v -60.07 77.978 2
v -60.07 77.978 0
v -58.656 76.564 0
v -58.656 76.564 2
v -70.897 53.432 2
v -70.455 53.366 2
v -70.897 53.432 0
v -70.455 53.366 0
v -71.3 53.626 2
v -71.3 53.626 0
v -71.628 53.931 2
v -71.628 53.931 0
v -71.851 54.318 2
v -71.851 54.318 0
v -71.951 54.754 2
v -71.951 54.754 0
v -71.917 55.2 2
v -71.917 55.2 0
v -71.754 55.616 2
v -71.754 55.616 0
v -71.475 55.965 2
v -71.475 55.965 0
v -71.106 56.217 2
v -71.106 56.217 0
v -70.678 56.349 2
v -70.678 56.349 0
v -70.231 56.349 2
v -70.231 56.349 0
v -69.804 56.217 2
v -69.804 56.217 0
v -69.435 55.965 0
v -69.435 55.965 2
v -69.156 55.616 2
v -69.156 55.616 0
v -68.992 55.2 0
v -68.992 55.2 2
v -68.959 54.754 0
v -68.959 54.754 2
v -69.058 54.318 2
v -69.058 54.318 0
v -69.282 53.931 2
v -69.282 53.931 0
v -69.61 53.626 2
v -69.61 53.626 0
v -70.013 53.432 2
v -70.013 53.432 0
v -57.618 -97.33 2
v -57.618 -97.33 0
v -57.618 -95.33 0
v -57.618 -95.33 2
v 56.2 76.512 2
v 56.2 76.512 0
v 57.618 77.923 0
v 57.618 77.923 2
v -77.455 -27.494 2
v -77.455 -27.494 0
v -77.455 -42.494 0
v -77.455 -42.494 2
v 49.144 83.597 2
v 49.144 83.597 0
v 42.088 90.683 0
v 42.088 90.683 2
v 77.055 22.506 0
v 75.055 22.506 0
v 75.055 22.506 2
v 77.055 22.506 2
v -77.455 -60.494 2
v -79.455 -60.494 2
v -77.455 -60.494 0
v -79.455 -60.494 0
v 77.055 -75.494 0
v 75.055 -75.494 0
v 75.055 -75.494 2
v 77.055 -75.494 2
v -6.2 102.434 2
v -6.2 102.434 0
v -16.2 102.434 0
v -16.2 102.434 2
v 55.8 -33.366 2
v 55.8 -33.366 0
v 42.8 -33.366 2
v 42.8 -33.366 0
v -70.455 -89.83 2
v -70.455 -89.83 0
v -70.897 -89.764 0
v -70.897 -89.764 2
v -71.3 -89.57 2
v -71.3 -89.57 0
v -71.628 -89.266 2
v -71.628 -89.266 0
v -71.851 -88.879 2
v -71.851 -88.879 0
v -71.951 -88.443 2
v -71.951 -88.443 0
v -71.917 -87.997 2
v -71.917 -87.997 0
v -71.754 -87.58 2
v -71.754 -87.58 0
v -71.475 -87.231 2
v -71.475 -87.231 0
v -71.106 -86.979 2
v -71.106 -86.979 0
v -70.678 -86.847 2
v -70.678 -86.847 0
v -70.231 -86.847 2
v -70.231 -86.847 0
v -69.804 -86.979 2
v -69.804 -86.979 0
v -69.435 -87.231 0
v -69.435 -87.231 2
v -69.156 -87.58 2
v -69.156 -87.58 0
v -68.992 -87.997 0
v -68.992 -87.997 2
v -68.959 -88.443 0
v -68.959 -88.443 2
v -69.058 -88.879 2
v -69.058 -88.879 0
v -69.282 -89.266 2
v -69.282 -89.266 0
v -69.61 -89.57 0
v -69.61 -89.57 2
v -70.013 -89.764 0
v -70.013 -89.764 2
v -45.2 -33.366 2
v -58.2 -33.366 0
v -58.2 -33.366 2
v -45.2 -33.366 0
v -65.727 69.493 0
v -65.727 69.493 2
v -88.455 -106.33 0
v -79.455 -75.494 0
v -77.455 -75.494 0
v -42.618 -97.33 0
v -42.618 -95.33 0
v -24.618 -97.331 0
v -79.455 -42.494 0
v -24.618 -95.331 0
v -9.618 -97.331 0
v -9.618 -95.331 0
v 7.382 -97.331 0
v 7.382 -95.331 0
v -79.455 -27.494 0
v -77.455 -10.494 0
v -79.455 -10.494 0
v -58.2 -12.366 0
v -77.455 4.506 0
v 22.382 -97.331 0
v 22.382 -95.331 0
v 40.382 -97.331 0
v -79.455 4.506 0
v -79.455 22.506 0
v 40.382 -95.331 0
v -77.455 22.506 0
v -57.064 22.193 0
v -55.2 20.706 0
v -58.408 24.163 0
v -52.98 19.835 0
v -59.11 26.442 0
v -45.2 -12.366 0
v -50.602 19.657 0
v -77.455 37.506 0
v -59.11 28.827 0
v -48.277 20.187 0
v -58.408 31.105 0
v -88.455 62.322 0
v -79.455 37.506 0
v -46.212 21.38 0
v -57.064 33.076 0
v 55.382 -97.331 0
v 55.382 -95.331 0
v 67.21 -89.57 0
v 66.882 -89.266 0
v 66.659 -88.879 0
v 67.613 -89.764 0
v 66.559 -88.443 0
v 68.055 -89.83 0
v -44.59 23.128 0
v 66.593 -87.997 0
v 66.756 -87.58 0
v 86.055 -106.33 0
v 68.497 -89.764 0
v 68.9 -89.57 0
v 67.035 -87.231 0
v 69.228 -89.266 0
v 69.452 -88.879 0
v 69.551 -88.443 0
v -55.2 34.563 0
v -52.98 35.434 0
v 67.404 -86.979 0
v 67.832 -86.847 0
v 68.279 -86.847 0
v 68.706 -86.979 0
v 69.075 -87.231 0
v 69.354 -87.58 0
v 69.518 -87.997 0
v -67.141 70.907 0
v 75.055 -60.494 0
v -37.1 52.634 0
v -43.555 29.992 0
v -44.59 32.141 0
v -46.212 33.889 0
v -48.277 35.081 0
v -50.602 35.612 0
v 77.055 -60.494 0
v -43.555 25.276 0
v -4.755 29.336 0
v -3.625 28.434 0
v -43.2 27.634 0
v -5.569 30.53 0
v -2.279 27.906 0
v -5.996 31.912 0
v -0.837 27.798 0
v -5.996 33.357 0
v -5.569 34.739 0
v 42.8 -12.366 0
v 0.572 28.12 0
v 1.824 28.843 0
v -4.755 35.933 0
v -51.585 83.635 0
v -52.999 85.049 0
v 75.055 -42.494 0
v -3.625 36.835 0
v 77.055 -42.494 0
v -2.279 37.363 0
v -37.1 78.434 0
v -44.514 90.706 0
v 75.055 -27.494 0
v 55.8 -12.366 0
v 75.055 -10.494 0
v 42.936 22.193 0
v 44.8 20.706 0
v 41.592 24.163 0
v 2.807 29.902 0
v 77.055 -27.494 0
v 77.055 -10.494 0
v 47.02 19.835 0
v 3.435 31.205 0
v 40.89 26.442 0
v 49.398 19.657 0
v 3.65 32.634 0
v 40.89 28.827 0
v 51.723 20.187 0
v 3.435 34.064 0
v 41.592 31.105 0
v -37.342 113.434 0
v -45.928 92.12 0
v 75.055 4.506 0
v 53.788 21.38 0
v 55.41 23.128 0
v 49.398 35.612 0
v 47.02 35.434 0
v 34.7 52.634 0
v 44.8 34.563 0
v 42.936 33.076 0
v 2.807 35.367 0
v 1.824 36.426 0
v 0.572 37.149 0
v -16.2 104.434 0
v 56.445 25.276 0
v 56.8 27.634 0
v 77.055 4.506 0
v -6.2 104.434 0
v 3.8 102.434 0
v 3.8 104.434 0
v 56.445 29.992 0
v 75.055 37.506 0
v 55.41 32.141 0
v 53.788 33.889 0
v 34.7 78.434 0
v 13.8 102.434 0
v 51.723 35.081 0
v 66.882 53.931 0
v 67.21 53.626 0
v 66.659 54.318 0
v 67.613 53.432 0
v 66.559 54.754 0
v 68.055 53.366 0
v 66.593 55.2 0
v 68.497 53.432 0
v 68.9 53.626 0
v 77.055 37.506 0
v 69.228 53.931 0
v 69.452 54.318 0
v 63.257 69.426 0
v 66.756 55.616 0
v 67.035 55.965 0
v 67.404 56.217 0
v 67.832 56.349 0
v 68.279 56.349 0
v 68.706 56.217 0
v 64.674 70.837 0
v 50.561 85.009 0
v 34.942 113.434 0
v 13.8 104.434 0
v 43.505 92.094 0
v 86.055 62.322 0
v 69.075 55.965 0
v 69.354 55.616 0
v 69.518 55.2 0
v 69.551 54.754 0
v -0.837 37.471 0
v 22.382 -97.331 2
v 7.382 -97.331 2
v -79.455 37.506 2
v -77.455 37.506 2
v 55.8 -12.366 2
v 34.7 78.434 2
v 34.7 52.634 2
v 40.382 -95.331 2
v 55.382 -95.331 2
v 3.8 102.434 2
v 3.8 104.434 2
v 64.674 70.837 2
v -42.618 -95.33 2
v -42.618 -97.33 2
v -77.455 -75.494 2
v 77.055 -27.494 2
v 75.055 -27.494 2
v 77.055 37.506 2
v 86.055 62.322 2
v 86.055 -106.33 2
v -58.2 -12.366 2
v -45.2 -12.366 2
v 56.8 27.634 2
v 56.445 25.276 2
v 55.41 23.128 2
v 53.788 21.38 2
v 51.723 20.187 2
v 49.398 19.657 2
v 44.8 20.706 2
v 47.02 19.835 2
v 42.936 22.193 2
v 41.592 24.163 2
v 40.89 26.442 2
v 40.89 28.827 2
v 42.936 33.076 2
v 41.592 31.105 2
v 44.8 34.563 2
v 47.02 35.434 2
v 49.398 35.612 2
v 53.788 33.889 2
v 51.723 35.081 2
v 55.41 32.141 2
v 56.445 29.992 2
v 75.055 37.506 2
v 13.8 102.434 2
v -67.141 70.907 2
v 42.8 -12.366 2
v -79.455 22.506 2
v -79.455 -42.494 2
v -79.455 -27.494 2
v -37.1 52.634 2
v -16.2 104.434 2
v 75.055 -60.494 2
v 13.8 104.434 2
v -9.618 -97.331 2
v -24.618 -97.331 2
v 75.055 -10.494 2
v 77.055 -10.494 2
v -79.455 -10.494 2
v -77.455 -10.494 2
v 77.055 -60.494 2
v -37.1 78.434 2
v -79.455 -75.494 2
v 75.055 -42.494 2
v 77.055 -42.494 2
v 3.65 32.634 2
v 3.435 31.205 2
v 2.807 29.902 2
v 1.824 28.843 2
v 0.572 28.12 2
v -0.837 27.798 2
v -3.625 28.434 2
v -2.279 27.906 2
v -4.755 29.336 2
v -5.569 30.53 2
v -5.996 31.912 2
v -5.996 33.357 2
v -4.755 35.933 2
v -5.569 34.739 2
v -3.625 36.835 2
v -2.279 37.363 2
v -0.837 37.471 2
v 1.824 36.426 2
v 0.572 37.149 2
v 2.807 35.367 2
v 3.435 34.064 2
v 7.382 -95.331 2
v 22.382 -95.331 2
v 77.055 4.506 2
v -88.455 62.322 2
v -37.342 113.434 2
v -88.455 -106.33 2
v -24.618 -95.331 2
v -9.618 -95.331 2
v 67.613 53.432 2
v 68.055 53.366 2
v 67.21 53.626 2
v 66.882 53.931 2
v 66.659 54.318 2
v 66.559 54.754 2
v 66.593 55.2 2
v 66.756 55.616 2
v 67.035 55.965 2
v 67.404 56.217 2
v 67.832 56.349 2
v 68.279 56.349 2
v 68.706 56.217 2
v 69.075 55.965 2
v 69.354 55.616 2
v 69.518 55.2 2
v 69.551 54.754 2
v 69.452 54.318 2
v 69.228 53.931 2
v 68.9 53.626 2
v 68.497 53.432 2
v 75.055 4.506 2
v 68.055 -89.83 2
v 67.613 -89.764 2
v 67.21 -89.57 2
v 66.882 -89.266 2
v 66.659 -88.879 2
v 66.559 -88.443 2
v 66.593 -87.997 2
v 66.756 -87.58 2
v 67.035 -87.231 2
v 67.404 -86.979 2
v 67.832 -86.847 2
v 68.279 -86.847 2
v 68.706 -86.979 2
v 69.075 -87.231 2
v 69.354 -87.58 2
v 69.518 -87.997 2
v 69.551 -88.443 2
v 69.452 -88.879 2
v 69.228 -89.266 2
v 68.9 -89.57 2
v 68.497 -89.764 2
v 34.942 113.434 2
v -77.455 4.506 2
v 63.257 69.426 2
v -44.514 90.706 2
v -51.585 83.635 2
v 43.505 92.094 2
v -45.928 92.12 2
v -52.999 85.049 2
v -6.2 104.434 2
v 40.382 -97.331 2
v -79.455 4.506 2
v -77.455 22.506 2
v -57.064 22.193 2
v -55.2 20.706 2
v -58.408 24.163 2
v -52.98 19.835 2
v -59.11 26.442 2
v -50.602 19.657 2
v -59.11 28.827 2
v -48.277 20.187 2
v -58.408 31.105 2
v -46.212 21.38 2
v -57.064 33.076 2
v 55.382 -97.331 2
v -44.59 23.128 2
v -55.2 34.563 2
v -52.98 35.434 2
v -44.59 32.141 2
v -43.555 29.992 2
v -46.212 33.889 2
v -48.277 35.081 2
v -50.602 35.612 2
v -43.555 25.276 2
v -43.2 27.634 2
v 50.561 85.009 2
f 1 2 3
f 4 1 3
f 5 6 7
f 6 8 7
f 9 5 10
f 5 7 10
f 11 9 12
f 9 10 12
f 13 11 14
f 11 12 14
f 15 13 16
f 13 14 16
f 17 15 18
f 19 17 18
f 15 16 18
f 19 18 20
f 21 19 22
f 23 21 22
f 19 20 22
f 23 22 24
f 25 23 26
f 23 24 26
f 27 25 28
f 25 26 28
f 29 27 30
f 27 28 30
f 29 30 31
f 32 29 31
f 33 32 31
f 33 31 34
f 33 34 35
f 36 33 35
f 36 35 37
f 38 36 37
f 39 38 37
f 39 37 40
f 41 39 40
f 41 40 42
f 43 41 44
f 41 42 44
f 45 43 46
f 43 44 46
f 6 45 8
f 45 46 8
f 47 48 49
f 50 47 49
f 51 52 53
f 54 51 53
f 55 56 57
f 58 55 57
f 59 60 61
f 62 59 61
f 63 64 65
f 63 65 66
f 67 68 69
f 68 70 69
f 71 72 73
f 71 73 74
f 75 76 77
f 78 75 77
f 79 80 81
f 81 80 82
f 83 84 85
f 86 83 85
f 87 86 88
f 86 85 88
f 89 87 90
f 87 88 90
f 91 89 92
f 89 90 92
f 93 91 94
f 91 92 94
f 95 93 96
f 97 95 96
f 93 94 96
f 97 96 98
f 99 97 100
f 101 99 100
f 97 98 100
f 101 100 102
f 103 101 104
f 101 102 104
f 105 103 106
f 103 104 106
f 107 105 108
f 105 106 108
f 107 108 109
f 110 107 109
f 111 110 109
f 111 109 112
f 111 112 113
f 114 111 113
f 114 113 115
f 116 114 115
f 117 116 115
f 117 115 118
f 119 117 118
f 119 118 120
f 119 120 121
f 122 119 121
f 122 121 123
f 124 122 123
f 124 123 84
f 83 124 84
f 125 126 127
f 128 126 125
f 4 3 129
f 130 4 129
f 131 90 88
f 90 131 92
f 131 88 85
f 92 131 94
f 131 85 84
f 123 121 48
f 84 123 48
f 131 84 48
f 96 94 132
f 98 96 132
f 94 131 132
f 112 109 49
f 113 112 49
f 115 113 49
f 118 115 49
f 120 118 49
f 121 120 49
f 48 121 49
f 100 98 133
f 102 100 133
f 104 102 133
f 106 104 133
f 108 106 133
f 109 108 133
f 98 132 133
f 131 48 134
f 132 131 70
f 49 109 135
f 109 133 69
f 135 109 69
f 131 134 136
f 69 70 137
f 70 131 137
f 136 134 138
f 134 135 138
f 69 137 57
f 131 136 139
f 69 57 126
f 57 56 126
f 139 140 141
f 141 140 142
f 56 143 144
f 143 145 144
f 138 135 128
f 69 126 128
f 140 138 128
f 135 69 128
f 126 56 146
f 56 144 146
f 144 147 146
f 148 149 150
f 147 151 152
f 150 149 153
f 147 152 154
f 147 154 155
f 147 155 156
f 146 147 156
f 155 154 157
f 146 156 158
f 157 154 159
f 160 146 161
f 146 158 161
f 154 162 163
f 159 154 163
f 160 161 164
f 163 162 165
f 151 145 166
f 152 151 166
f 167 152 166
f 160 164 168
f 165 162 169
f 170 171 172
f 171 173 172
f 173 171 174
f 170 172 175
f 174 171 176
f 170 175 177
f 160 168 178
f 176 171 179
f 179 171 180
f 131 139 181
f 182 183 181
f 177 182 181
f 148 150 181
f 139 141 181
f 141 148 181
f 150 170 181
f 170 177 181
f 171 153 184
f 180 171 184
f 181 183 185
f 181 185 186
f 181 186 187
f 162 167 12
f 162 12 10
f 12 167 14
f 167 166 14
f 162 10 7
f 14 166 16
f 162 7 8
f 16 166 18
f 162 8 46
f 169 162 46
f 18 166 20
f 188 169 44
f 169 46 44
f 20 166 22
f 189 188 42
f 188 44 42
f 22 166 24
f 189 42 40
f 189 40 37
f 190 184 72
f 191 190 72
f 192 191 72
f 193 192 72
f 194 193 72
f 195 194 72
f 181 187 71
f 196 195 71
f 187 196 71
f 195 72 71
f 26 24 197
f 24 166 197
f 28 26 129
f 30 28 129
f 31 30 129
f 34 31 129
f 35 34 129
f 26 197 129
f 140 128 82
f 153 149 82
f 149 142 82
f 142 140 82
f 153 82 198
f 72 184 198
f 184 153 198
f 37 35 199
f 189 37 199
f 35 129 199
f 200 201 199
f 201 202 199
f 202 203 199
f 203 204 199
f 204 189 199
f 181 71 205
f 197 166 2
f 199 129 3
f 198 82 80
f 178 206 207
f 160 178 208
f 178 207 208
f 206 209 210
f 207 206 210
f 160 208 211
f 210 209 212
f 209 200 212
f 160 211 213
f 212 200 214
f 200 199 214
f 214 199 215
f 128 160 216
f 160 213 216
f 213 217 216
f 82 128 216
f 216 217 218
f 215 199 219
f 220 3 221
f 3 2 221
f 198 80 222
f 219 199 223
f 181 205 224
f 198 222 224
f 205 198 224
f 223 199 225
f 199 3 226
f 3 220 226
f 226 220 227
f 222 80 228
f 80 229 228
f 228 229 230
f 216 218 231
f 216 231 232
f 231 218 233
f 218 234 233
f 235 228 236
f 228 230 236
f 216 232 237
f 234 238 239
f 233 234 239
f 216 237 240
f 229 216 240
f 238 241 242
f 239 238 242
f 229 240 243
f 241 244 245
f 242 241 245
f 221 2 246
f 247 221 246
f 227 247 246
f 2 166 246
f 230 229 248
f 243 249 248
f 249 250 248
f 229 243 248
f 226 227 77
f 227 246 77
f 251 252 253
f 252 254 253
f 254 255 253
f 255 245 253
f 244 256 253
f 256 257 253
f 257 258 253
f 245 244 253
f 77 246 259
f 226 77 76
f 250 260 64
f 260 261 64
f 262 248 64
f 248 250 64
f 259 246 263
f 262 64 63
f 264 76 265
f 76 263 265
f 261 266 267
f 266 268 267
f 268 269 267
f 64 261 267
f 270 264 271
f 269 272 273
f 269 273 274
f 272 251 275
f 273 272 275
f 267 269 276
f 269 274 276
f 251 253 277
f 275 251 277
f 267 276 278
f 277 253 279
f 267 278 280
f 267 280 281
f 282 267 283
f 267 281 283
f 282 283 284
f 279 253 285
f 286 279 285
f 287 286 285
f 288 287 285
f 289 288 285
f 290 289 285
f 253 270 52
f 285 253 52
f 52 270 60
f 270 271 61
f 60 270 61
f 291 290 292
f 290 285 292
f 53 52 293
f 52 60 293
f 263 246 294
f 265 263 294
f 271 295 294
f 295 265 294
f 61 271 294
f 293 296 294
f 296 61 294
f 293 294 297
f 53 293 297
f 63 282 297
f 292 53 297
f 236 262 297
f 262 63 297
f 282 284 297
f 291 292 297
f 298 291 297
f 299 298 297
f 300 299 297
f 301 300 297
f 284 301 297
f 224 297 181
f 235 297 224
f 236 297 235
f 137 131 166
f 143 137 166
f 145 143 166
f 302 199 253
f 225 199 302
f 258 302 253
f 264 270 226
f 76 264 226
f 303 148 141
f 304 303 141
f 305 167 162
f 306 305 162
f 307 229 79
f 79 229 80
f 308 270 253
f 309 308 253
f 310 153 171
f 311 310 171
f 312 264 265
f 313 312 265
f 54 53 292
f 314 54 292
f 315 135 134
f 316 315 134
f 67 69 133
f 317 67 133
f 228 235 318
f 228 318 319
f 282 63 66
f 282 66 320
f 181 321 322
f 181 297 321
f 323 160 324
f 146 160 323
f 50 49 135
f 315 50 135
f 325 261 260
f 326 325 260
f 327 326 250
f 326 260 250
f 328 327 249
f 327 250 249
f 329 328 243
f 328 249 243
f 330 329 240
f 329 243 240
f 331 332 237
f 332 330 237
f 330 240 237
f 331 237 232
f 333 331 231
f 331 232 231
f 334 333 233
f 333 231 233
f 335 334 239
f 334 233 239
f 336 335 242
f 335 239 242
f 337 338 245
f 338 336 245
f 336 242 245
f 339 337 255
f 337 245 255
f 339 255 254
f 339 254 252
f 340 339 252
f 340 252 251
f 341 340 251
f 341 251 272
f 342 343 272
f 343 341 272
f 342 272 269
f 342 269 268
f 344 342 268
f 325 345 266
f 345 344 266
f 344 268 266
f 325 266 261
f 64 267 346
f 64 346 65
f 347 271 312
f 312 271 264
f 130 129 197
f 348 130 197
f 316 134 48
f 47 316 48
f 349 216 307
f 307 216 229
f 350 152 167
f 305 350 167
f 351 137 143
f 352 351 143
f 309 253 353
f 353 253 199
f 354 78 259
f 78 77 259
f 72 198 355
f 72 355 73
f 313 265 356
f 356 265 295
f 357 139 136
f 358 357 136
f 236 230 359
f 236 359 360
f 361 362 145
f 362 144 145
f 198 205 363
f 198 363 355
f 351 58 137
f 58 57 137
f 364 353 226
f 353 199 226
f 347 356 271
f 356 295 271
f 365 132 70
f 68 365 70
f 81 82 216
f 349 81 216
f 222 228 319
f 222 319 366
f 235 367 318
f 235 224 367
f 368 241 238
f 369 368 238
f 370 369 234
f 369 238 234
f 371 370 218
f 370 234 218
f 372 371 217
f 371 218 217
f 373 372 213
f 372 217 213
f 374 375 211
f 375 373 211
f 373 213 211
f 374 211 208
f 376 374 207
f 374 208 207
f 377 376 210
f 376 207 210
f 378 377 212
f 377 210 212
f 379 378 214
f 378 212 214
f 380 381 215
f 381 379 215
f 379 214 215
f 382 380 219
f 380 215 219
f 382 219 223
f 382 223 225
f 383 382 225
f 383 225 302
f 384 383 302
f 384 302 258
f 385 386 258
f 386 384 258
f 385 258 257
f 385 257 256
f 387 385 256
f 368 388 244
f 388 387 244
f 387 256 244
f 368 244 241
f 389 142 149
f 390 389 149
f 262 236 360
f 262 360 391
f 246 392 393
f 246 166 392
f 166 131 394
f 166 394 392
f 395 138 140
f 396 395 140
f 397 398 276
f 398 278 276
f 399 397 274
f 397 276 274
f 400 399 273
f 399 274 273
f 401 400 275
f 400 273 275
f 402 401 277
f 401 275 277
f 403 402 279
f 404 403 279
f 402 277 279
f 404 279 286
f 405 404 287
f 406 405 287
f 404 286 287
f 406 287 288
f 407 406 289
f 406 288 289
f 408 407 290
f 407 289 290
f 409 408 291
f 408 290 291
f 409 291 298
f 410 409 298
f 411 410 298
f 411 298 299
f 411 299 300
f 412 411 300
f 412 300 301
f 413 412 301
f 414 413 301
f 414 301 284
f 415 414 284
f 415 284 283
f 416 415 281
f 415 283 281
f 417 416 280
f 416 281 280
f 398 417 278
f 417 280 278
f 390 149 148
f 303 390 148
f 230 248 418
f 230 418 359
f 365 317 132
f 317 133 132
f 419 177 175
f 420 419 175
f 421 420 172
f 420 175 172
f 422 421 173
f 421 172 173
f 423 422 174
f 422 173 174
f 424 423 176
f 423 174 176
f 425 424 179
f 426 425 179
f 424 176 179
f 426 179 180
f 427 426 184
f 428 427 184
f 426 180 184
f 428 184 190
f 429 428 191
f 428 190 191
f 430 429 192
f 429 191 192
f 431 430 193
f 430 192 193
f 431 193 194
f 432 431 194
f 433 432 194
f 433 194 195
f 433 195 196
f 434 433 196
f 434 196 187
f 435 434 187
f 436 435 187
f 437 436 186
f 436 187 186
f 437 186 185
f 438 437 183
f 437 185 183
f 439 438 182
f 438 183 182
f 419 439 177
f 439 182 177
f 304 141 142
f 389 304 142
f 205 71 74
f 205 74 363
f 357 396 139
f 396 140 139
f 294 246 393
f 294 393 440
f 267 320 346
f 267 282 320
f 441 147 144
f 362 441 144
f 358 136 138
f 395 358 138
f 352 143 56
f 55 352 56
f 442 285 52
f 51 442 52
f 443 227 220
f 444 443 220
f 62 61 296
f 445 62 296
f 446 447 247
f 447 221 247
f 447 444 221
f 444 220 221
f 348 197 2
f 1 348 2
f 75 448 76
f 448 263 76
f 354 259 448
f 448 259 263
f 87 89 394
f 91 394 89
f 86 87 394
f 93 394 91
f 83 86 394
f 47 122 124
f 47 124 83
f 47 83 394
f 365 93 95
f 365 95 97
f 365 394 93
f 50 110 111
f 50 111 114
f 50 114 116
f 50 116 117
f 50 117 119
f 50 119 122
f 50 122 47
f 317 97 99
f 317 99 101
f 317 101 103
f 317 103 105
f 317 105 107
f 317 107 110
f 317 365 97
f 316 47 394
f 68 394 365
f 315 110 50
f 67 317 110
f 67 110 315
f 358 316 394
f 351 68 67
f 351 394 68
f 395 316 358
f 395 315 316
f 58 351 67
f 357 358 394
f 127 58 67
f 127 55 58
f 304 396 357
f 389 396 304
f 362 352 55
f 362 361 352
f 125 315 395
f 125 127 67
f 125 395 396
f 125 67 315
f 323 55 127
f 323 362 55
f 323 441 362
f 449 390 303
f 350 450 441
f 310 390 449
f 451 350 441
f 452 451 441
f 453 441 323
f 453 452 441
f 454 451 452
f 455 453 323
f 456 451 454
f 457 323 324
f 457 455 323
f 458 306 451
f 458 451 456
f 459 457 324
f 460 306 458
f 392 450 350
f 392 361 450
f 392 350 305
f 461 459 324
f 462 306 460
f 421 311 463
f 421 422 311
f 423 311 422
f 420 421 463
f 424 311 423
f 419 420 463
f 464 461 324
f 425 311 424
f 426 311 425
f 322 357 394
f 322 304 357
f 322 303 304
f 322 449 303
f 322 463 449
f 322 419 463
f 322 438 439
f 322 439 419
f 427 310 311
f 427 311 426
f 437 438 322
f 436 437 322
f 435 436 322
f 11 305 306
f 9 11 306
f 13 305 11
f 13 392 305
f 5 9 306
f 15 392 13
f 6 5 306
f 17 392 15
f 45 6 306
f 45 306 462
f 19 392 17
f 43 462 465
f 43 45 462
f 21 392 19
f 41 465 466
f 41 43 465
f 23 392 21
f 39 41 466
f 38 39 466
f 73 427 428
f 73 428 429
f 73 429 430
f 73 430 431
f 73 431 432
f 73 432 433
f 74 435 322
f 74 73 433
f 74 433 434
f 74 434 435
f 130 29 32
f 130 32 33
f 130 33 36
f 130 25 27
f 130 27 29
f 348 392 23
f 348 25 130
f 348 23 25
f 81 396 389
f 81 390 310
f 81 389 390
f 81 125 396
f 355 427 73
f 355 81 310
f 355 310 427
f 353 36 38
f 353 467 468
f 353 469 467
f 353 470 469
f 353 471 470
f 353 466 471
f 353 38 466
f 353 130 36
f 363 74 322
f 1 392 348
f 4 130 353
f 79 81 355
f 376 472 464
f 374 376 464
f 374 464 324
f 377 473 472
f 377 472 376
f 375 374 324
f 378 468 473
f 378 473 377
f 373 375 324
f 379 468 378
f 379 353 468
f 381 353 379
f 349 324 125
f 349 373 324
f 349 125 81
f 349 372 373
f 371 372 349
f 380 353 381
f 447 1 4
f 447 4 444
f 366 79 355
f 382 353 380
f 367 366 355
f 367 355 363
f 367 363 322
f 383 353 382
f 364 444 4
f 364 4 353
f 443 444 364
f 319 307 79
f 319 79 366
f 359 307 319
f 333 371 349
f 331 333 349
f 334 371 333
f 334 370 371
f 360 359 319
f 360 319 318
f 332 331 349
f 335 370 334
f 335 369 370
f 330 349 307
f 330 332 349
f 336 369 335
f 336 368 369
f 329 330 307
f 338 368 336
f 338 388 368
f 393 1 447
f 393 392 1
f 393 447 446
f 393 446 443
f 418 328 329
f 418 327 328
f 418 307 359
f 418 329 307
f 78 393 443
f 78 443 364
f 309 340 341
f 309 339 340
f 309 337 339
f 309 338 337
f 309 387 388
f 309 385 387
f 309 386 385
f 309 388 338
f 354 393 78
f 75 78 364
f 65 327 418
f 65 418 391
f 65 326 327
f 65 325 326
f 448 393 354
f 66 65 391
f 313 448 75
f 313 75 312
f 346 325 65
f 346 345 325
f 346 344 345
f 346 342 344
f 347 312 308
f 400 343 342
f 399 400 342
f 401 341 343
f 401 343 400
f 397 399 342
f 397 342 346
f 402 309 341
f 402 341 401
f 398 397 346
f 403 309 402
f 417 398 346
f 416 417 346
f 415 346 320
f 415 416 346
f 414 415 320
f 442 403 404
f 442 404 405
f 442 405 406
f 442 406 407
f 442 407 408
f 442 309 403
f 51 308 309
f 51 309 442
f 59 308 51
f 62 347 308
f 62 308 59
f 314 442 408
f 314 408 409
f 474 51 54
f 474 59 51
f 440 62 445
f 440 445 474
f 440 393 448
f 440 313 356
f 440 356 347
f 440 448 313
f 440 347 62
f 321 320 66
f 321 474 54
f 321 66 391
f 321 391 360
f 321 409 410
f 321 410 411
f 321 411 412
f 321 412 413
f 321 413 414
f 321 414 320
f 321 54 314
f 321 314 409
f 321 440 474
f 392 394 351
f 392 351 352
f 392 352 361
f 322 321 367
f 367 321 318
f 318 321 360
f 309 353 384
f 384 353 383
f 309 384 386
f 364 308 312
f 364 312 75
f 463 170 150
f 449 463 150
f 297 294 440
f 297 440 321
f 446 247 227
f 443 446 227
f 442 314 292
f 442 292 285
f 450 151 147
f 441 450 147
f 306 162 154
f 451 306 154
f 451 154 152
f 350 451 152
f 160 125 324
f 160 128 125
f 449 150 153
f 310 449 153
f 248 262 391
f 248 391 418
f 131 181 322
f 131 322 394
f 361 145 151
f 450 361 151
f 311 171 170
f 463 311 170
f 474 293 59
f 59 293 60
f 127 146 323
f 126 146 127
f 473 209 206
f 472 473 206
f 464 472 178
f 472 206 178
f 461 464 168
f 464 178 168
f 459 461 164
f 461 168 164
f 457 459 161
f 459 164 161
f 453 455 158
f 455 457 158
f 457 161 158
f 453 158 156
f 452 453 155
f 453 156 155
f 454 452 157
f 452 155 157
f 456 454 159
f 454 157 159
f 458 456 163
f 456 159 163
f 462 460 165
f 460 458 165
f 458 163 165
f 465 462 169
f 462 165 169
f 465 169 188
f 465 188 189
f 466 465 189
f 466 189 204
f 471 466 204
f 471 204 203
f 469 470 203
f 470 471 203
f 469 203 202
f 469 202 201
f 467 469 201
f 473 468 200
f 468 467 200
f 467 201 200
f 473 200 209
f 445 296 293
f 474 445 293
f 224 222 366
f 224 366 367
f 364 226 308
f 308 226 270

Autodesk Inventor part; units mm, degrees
ref_plane "YZ Plane" through (0, 0, 0) normal (1, 0, 0) x (0, 1, 0)
ref_plane "XZ Plane" through (0, 0, 0) normal (0, 1, 0) x (-1, 0, 0)
ref_plane "XY Plane" through (0, 0, 0) normal (0, 0, 1) x (1, 0, 0)
sketch "Sketch1" plane through (0, 0, 0) normal (0, 0, 1) x (1, 0, 0)
  line L0 (-77.4547, 22.5062) -> (-79.4547, 22.5062)
  line L1 (-88.4548, -106.3305) -> (-88.4548, 62.3216)
  line L2 (-77.4547, -10.4938) -> (-79.4547, -10.4938)
  line L3 (-77.4547, 4.5062) -> (-77.4547, -10.4938)
  line L4 (-79.4547, 4.5062) -> (-77.4547, 4.5062)
  line L5 (-79.4547, -10.4938) -> (-79.4547, 4.5062)
  line L6 (-77.4547, 37.5062) -> (-77.4547, 22.5062)
  line L7 (-79.4547, 37.5062) -> (-77.4547, 37.5062)
  line L8 (-79.4547, 22.5062) -> (-79.4547, 37.5062)
  line L9 (-77.4547, -42.4938) -> (-79.4547, -42.4938)
  line L10 (-77.4547, -27.4938) -> (-77.4547, -42.4938)
  line L11 (-79.4547, -42.4938) -> (-79.4547, -27.4938)
  line L12 (-79.4547, -27.4938) -> (-77.4547, -27.4938)
  line L13 (-58.1998, -33.3656) -> (-45.1998, -33.3656)
  line L14 (-45.1998, -33.3656) -> (-45.1998, -12.3656)
  line L15 (-58.1998, -12.3656) -> (-58.1998, -33.3656)
  line L16 (-45.1998, -12.3656) -> (-58.1998, -12.3656)
  line L17 (-79.4548, -60.4938) -> (-77.4548, -60.4938)
  line L18 (-77.4548, -60.4938) -> (-77.4548, -75.4938)
  line L19 (-79.4548, -75.4938) -> (-79.4548, -60.4938)
  line L20 (-77.4548, -75.4938) -> (-79.4548, -75.4938)
  circle A0 centre (-70.4548, -88.3305) radius 1.5
  line L21 (-57.6182, -95.3305) -> (-42.6182, -95.3305)
  line L22 (-42.6182, -95.3305) -> (-42.6182, -97.3305)
  line L23 (-42.6182, -97.3305) -> (-57.6182, -97.3305)
  line L24 (-57.6182, -97.3305) -> (-57.6182, -95.3305)
  line L25 (-65.7269, 69.4932) -> (-67.1411, 70.9074)
  line L26 (-60.0701, 77.9785) -> (-58.6558, 76.5643)
  line L27 (-58.6558, 76.5643) -> (-65.7269, 69.4932)
  line L28 (-67.1411, 70.9074) -> (-60.0701, 77.9785)
  line L29 (-45.9277, 92.1205) -> (-44.5135, 90.7062)
  line L30 (-44.5135, 90.7062) -> (-51.5846, 83.6352)
  line L31 (-52.9988, 85.0494) -> (-45.9277, 92.1205)
  line L32 (-88.4548, 62.3216) -> (-37.342, 113.4344)
  line L33 (-51.5846, 83.6352) -> (-52.9988, 85.0494)
  line L34 (-37.0998, 52.6344) -> (-37.0998, 78.4344)
  line L35 (-16.1999, 102.4344) -> (-16.1999, 104.4344)
  line L36 (-6.1999, 102.4344) -> (-16.1999, 102.4344)
  line L37 (-16.1999, 104.4344) -> (-6.1999, 104.4344)
  line L38 (-6.1999, 104.4344) -> (-6.1999, 102.4344)
  line L39 (3.8002, 102.4342) -> (3.8002, 104.4342)
  line L40 (13.8002, 102.4342) -> (3.8002, 102.4342)
  line L41 (13.8002, 104.4342) -> (13.8002, 102.4342)
  line L42 (3.8002, 104.4342) -> (13.8002, 104.4342)
  line L43 (-37.0998, 78.4344) -> (34.7002, 78.4344)
  line L44 (-37.342, 113.4344) -> (34.9424, 113.4344)
  line L45 (34.7002, 52.6344) -> (-37.0998, 52.6344)
  line L46 (34.7002, 78.4344) -> (34.7002, 52.6344)
  line L47 (22.3818, -95.3307) -> (22.3818, -97.3307)
  line L48 (40.3818, -97.3307) -> (40.3818, -95.3307)
  line L49 (55.3818, -95.3307) -> (55.3818, -97.3307)
  line L50 (55.3818, -97.3307) -> (40.3818, -97.3307)
  line L51 (40.3818, -95.3307) -> (55.3818, -95.3307)
  line L52 (7.3818, -95.3307) -> (22.3818, -95.3307)
  line L53 (22.3818, -97.3307) -> (7.3818, -97.3307)
  line L54 (7.3818, -97.3307) -> (7.3818, -95.3307)
  line L55 (86.0552, -106.3305) -> (-88.4548, -106.3305)
  line L56 (-9.6182, -95.3307) -> (-9.6182, -97.3307)
  line L57 (-24.6182, -95.3307) -> (-9.6182, -95.3307)
  line L58 (-24.6182, -97.3307) -> (-24.6182, -95.3307)
  line L59 (-9.6182, -97.3307) -> (-24.6182, -97.3307)
  line L60 (86.0552, 62.3216) -> (86.0552, -106.3305)
  circle A1 centre (68.0552, -88.3305) radius 1.5
  line L61 (75.0552, -75.4938) -> (77.0552, -75.4938)
  line L62 (77.0552, -60.4938) -> (75.0552, -60.4938)
  line L63 (77.0552, -75.4938) -> (77.0552, -60.4938)
  line L64 (75.055, -42.4938) -> (77.055, -42.4938)
  line L65 (75.055, -27.4938) -> (75.055, -42.4938)
  line L66 (77.055, -42.4938) -> (77.055, -27.4938)
  line L67 (75.0552, -60.4938) -> (75.0552, -75.4938)
  line L68 (42.8002, -12.3656) -> (55.8002, -12.3656)
  line L69 (77.055, 4.5062) -> (75.055, 4.5062)
  line L70 (75.055, 4.5062) -> (75.055, -10.4938)
  line L71 (77.055, -10.4938) -> (77.055, 4.5062)
  line L72 (42.8002, -33.3656) -> (42.8002, -12.3656)
  line L73 (75.055, -10.4938) -> (77.055, -10.4938)
  line L74 (55.8002, -12.3656) -> (55.8002, -33.3656)
  line L75 (55.8002, -33.3656) -> (42.8002, -33.3656)
  line L76 (77.055, -27.4938) -> (75.055, -27.4938)
  line L77 (77.055, 37.5062) -> (75.055, 37.5062)
  line L78 (75.055, 22.5062) -> (77.055, 22.5062)
  line L79 (77.055, 22.5062) -> (77.055, 37.5062)
  line L80 (75.055, 37.5062) -> (75.055, 22.5062)
  circle A2 centre (48.8002, 27.6344) radius 8
  circle A3 centre (68.0552, 54.8658) radius 1.5
  line L81 (64.6739, 70.8372) -> (63.2567, 69.426)
  line L82 (63.2567, 69.426) -> (56.2003, 76.5117)
  line L83 (56.2003, 76.5117) -> (57.6175, 77.9229)
  line L84 (57.6175, 77.9229) -> (64.6739, 70.8372)
  line L85 (50.5611, 85.0087) -> (49.1439, 83.5974)
  line L86 (49.1439, 83.5974) -> (42.0875, 90.6831)
  line L87 (42.0875, 90.6831) -> (43.5047, 92.0944)
  line L88 (43.5047, 92.0944) -> (50.5611, 85.0087)
  line L89 (34.9424, 113.4344) -> (86.0552, 62.3216)
  circle A4 centre (-70.4548, 54.8658) radius 1.5
  circle A5 centre (-51.1998, 27.6344) radius 8
  circle A6 centre (-1.1998, 32.6344) radius 4.85
  point P0 (0, 0)
  dimension "d44" = 10
  dimension "d45" = 2
  dimension "d46" = 10
  dimension "d47" = 2
  dimension "d48" = 10
  dimension "d49" = 2
  dimension "d50" = 10
  dimension "d51" = 2
  dimension "d52" = 10
  dimension "d53" = 10
  dimension "d54" = 2
  dimension "d55" = 10
  dimension "d56" = 2
  dimension "d57" = 10
  dimension "d58" = 15
  dimension "d59" = 2
  dimension "d60" = 15
  dimension "d61" = 18
  dimension "d62" = 15
  dimension "d63" = 17
  dimension "d64" = 2
  dimension "d65" = 15
  dimension "d66" = 15
  dimension "d67" = 18
  dimension "d68" = 15
  dimension "d69" = 17
  dimension "d70" = 15
  dimension "d71" = 18
  dimension "d72" = 15
  dimension "d73" = 18
  dimension "d74" = 219.7649
  dimension "d75" = 174.51
  dimension "d76" = 3
  dimension "d77" = 3
  dimension "d78" = 71.8
  dimension "d79" = 25.8
  dimension "d80" = 35
  dimension "d81" = 16
  dimension "d82" = 25
  dimension "d83" = 13
  dimension "d84" = 21
  dimension "d85" = 40
  dimension "d86" = 9.7
  dimension "d87" = 20
extrude "Extrusion1" add sketch "Sketch1" along normal blind 2 contours L1 L32 L44 L89 L60 L55 | A0 | A1 | A3 | A4
sketch "Sketch2" plane through (0, 0, 2) normal (0, 0, 1) x (1, 0, 0)
  line L0 (-77.4547, -10.4938) -> (-79.4547, -10.4938)
  line L1 (-45.1998, -12.3656) -> (-58.1998, -12.3656)
  line L2 (-79.4547, 4.5062) -> (-77.4547, 4.5062)
  line L3 (-77.4547, 4.5062) -> (-77.4547, -10.4938)
  line L4 (-79.4547, -10.4938) -> (-79.4547, 4.5062)
  line L5 (-77.4547, 22.5062) -> (-79.4547, 22.5062)
  line L6 (-24.6182, -97.3307) -> (-24.6182, -95.3307)
  line L7 (-9.6182, -95.3307) -> (-9.6182, -97.3307)
  line L8 (-24.6182, -95.3307) -> (-9.6182, -95.3307)
  line L9 (-9.6182, -97.3307) -> (-24.6182, -97.3307)
  line L10 (-45.9277, 92.1205) -> (-44.5135, 90.7062)
  line L11 (-44.5135, 90.7062) -> (-51.5846, 83.6352)
  line L12 (-52.9988, 85.0494) -> (-45.9277, 92.1205)
  line L13 (-51.5846, 83.6352) -> (-52.9988, 85.0494)
  line L14 (-60.0701, 77.9785) -> (-58.6558, 76.5643)
  line L15 (-58.6558, 76.5643) -> (-65.7269, 69.4932)
  line L16 (-67.1411, 70.9074) -> (-60.0701, 77.9785)
  line L17 (-65.7269, 69.4932) -> (-67.1411, 70.9074)
  line L18 (-88.4548, 62.3216) -> (-37.342, 113.4344)
  line L19 (-88.4548, -106.3305) -> (-88.4548, 62.3216)
  line L20 (-58.1998, -12.3656) -> (-58.1998, -33.3656)
  line L21 (-45.1998, -33.3656) -> (-45.1998, -12.3656)
  line L22 (-79.4547, -27.4938) -> (-77.4547, -27.4938)
  line L23 (-58.1998, -33.3656) -> (-45.1998, -33.3656)
  line L24 (-79.4547, -42.4938) -> (-79.4547, -27.4938)
  line L25 (-77.4547, -27.4938) -> (-77.4547, -42.4938)
  line L26 (-77.4547, -42.4938) -> (-79.4547, -42.4938)
  line L27 (7.3818, -97.3307) -> (7.3818, -95.3307)
  line L28 (7.3818, -95.3307) -> (22.3818, -95.3307)
  line L29 (22.3818, -97.3307) -> (7.3818, -97.3307)
  line L30 (40.3818, -97.3307) -> (40.3818, -95.3307)
  line L31 (55.3818, -95.3307) -> (55.3818, -97.3307)
  line L32 (22.3818, -95.3307) -> (22.3818, -97.3307)
  line L33 (-16.1999, 102.4344) -> (-16.1999, 104.4344)
  line L34 (-6.1999, 102.4344) -> (-16.1999, 102.4344)
  line L35 (-16.1999, 104.4344) -> (-6.1999, 104.4344)
  line L36 (-6.1999, 104.4344) -> (-6.1999, 102.4344)
  line L37 (3.8002, 102.4342) -> (3.8002, 104.4342)
  line L38 (13.8002, 102.4342) -> (3.8002, 102.4342)
  line L39 (13.8002, 104.4342) -> (13.8002, 102.4342)
  line L40 (3.8002, 104.4342) -> (13.8002, 104.4342)
  circle A0 centre (-1.1998, 32.6344) radius 4.85
  line L41 (42.0875, 90.6831) -> (43.5047, 92.0944)
  line L42 (-37.0998, 52.6344) -> (-37.0998, 78.4344)
  line L43 (34.7002, 78.4344) -> (34.7002, 52.6344)
  line L44 (34.7002, 52.6344) -> (-37.0998, 52.6344)
  line L45 (-37.0998, 78.4344) -> (34.7002, 78.4344)
  line L46 (-37.342, 113.4344) -> (34.9424, 113.4344)
  line L47 (86.0552, -106.3305) -> (-88.4548, -106.3305)
  line L48 (-42.6182, -95.3305) -> (-42.6182, -97.3305)
  line L49 (-42.6182, -97.3305) -> (-57.6182, -97.3305)
  line L50 (-57.6182, -95.3305) -> (-42.6182, -95.3305)
  line L51 (-57.6182, -97.3305) -> (-57.6182, -95.3305)
  circle A1 centre (-70.4548, -88.3305) radius 1.5
  line L52 (-77.4548, -60.4938) -> (-77.4548, -75.4938)
  line L53 (-79.4548, -60.4938) -> (-77.4548, -60.4938)
  line L54 (-79.4548, -75.4938) -> (-79.4548, -60.4938)
  line L55 (-77.4548, -75.4938) -> (-79.4548, -75.4938)
  line L56 (55.3818, -97.3307) -> (40.3818, -97.3307)
  line L57 (40.3818, -95.3307) -> (55.3818, -95.3307)
  circle A2 centre (68.0552, -88.3305) radius 1.5
  line L58 (75.0552, -60.4938) -> (75.0552, -75.4938)
  line L59 (77.0552, -60.4938) -> (75.0552, -60.4938)
  line L60 (77.0552, -75.4938) -> (77.0552, -60.4938)
  line L61 (86.0552, 62.3216) -> (86.0552, -106.3305)
  line L62 (75.055, -42.4938) -> (77.055, -42.4938)
  line L63 (75.0552, -75.4938) -> (77.0552, -75.4938)
  line L64 (75.055, -27.4938) -> (75.055, -42.4938)
  line L65 (77.055, -42.4938) -> (77.055, -27.4938)
  line L66 (77.055, -27.4938) -> (75.055, -27.4938)
  line L67 (55.8002, -33.3656) -> (42.8002, -33.3656)
  line L68 (75.055, -10.4938) -> (77.055, -10.4938)
  line L69 (42.8002, -12.3656) -> (55.8002, -12.3656)
  line L70 (42.8002, -33.3656) -> (42.8002, -12.3656)
  line L71 (77.055, -10.4938) -> (77.055, 4.5062)
  line L72 (77.055, 4.5062) -> (75.055, 4.5062)
  line L73 (75.055, 4.5062) -> (75.055, -10.4938)
  line L74 (55.8002, -12.3656) -> (55.8002, -33.3656)
  line L75 (64.6739, 70.8372) -> (63.2567, 69.426)
  line L76 (63.2567, 69.426) -> (56.2003, 76.5117)
  line L77 (56.2003, 76.5117) -> (57.6175, 77.9229)
  line L78 (57.6175, 77.9229) -> (64.6739, 70.8372)
  line L79 (50.5611, 85.0087) -> (49.1439, 83.5974)
  line L80 (49.1439, 83.5974) -> (42.0875, 90.6831)
  line L81 (43.5047, 92.0944) -> (50.5611, 85.0087)
  line L82 (34.9424, 113.4344) -> (86.0552, 62.3216)
  line L83 (75.055, 22.5062) -> (77.055, 22.5062)
  line L84 (77.055, 37.5062) -> (75.055, 37.5062)
  line L85 (77.055, 22.5062) -> (77.055, 37.5062)
  line L86 (75.055, 37.5062) -> (75.055, 22.5062)
  circle A3 centre (68.0552, 54.8658) radius 1.5
  circle A4 centre (48.8002, 27.6344) radius 8
  circle A5 centre (-51.1998, 27.6344) radius 8
  line L87 (-77.4547, 37.5062) -> (-77.4547, 22.5062)
  line L88 (-79.4547, 22.5062) -> (-79.4547, 37.5062)
  line L89 (-79.4547, 37.5062) -> (-77.4547, 37.5062)
  circle A6 centre (-70.4548, 54.8658) radius 1.5
  point P0 (0, 0)
  point P1 (0, 0)
  dimension "d90" = 10
  dimension "d91" = 2
  dimension "d92" = 10
  dimension "d93" = 2
  dimension "d94" = 10
  dimension "d95" = 2
  dimension "d96" = 10
  dimension "d97" = 2
  dimension "d98" = 10
  dimension "d99" = 10
  dimension "d100" = 2
  dimension "d101" = 10
  dimension "d102" = 2
  dimension "d103" = 10
  dimension "d104" = 15
  dimension "d105" = 2
  dimension "d106" = 15
  dimension "d107" = 18
  dimension "d108" = 15
  dimension "d109" = 17
  dimension "d110" = 2
  dimension "d111" = 15
  dimension "d112" = 15
  dimension "d113" = 18
  dimension "d114" = 15
  dimension "d115" = 17
  dimension "d116" = 15
  dimension "d117" = 18
  dimension "d118" = 15
  dimension "d119" = 18
  dimension "d120" = 219.7649
  dimension "d121" = 174.51
  dimension "d122" = 3
  dimension "d123" = 3
  dimension "d124" = 71.8
  dimension "d125" = 25.8
  dimension "d126" = 35
  dimension "d127" = 16
  dimension "d128" = 25
  dimension "d129" = 13
  dimension "d130" = 21
  dimension "d131" = 40
  dimension "d132" = 9.7
  dimension "d133" = 20
hole "Hole1" at (-70.4548, 54.8658, 2) at (68.0552, 54.8658, 2) at (68.0552, -88.3305, 2) at (-70.4548, -88.3305, 2) direction (0, 0, -1) diameter 3 end through all
properties part number "tutup kepala"
